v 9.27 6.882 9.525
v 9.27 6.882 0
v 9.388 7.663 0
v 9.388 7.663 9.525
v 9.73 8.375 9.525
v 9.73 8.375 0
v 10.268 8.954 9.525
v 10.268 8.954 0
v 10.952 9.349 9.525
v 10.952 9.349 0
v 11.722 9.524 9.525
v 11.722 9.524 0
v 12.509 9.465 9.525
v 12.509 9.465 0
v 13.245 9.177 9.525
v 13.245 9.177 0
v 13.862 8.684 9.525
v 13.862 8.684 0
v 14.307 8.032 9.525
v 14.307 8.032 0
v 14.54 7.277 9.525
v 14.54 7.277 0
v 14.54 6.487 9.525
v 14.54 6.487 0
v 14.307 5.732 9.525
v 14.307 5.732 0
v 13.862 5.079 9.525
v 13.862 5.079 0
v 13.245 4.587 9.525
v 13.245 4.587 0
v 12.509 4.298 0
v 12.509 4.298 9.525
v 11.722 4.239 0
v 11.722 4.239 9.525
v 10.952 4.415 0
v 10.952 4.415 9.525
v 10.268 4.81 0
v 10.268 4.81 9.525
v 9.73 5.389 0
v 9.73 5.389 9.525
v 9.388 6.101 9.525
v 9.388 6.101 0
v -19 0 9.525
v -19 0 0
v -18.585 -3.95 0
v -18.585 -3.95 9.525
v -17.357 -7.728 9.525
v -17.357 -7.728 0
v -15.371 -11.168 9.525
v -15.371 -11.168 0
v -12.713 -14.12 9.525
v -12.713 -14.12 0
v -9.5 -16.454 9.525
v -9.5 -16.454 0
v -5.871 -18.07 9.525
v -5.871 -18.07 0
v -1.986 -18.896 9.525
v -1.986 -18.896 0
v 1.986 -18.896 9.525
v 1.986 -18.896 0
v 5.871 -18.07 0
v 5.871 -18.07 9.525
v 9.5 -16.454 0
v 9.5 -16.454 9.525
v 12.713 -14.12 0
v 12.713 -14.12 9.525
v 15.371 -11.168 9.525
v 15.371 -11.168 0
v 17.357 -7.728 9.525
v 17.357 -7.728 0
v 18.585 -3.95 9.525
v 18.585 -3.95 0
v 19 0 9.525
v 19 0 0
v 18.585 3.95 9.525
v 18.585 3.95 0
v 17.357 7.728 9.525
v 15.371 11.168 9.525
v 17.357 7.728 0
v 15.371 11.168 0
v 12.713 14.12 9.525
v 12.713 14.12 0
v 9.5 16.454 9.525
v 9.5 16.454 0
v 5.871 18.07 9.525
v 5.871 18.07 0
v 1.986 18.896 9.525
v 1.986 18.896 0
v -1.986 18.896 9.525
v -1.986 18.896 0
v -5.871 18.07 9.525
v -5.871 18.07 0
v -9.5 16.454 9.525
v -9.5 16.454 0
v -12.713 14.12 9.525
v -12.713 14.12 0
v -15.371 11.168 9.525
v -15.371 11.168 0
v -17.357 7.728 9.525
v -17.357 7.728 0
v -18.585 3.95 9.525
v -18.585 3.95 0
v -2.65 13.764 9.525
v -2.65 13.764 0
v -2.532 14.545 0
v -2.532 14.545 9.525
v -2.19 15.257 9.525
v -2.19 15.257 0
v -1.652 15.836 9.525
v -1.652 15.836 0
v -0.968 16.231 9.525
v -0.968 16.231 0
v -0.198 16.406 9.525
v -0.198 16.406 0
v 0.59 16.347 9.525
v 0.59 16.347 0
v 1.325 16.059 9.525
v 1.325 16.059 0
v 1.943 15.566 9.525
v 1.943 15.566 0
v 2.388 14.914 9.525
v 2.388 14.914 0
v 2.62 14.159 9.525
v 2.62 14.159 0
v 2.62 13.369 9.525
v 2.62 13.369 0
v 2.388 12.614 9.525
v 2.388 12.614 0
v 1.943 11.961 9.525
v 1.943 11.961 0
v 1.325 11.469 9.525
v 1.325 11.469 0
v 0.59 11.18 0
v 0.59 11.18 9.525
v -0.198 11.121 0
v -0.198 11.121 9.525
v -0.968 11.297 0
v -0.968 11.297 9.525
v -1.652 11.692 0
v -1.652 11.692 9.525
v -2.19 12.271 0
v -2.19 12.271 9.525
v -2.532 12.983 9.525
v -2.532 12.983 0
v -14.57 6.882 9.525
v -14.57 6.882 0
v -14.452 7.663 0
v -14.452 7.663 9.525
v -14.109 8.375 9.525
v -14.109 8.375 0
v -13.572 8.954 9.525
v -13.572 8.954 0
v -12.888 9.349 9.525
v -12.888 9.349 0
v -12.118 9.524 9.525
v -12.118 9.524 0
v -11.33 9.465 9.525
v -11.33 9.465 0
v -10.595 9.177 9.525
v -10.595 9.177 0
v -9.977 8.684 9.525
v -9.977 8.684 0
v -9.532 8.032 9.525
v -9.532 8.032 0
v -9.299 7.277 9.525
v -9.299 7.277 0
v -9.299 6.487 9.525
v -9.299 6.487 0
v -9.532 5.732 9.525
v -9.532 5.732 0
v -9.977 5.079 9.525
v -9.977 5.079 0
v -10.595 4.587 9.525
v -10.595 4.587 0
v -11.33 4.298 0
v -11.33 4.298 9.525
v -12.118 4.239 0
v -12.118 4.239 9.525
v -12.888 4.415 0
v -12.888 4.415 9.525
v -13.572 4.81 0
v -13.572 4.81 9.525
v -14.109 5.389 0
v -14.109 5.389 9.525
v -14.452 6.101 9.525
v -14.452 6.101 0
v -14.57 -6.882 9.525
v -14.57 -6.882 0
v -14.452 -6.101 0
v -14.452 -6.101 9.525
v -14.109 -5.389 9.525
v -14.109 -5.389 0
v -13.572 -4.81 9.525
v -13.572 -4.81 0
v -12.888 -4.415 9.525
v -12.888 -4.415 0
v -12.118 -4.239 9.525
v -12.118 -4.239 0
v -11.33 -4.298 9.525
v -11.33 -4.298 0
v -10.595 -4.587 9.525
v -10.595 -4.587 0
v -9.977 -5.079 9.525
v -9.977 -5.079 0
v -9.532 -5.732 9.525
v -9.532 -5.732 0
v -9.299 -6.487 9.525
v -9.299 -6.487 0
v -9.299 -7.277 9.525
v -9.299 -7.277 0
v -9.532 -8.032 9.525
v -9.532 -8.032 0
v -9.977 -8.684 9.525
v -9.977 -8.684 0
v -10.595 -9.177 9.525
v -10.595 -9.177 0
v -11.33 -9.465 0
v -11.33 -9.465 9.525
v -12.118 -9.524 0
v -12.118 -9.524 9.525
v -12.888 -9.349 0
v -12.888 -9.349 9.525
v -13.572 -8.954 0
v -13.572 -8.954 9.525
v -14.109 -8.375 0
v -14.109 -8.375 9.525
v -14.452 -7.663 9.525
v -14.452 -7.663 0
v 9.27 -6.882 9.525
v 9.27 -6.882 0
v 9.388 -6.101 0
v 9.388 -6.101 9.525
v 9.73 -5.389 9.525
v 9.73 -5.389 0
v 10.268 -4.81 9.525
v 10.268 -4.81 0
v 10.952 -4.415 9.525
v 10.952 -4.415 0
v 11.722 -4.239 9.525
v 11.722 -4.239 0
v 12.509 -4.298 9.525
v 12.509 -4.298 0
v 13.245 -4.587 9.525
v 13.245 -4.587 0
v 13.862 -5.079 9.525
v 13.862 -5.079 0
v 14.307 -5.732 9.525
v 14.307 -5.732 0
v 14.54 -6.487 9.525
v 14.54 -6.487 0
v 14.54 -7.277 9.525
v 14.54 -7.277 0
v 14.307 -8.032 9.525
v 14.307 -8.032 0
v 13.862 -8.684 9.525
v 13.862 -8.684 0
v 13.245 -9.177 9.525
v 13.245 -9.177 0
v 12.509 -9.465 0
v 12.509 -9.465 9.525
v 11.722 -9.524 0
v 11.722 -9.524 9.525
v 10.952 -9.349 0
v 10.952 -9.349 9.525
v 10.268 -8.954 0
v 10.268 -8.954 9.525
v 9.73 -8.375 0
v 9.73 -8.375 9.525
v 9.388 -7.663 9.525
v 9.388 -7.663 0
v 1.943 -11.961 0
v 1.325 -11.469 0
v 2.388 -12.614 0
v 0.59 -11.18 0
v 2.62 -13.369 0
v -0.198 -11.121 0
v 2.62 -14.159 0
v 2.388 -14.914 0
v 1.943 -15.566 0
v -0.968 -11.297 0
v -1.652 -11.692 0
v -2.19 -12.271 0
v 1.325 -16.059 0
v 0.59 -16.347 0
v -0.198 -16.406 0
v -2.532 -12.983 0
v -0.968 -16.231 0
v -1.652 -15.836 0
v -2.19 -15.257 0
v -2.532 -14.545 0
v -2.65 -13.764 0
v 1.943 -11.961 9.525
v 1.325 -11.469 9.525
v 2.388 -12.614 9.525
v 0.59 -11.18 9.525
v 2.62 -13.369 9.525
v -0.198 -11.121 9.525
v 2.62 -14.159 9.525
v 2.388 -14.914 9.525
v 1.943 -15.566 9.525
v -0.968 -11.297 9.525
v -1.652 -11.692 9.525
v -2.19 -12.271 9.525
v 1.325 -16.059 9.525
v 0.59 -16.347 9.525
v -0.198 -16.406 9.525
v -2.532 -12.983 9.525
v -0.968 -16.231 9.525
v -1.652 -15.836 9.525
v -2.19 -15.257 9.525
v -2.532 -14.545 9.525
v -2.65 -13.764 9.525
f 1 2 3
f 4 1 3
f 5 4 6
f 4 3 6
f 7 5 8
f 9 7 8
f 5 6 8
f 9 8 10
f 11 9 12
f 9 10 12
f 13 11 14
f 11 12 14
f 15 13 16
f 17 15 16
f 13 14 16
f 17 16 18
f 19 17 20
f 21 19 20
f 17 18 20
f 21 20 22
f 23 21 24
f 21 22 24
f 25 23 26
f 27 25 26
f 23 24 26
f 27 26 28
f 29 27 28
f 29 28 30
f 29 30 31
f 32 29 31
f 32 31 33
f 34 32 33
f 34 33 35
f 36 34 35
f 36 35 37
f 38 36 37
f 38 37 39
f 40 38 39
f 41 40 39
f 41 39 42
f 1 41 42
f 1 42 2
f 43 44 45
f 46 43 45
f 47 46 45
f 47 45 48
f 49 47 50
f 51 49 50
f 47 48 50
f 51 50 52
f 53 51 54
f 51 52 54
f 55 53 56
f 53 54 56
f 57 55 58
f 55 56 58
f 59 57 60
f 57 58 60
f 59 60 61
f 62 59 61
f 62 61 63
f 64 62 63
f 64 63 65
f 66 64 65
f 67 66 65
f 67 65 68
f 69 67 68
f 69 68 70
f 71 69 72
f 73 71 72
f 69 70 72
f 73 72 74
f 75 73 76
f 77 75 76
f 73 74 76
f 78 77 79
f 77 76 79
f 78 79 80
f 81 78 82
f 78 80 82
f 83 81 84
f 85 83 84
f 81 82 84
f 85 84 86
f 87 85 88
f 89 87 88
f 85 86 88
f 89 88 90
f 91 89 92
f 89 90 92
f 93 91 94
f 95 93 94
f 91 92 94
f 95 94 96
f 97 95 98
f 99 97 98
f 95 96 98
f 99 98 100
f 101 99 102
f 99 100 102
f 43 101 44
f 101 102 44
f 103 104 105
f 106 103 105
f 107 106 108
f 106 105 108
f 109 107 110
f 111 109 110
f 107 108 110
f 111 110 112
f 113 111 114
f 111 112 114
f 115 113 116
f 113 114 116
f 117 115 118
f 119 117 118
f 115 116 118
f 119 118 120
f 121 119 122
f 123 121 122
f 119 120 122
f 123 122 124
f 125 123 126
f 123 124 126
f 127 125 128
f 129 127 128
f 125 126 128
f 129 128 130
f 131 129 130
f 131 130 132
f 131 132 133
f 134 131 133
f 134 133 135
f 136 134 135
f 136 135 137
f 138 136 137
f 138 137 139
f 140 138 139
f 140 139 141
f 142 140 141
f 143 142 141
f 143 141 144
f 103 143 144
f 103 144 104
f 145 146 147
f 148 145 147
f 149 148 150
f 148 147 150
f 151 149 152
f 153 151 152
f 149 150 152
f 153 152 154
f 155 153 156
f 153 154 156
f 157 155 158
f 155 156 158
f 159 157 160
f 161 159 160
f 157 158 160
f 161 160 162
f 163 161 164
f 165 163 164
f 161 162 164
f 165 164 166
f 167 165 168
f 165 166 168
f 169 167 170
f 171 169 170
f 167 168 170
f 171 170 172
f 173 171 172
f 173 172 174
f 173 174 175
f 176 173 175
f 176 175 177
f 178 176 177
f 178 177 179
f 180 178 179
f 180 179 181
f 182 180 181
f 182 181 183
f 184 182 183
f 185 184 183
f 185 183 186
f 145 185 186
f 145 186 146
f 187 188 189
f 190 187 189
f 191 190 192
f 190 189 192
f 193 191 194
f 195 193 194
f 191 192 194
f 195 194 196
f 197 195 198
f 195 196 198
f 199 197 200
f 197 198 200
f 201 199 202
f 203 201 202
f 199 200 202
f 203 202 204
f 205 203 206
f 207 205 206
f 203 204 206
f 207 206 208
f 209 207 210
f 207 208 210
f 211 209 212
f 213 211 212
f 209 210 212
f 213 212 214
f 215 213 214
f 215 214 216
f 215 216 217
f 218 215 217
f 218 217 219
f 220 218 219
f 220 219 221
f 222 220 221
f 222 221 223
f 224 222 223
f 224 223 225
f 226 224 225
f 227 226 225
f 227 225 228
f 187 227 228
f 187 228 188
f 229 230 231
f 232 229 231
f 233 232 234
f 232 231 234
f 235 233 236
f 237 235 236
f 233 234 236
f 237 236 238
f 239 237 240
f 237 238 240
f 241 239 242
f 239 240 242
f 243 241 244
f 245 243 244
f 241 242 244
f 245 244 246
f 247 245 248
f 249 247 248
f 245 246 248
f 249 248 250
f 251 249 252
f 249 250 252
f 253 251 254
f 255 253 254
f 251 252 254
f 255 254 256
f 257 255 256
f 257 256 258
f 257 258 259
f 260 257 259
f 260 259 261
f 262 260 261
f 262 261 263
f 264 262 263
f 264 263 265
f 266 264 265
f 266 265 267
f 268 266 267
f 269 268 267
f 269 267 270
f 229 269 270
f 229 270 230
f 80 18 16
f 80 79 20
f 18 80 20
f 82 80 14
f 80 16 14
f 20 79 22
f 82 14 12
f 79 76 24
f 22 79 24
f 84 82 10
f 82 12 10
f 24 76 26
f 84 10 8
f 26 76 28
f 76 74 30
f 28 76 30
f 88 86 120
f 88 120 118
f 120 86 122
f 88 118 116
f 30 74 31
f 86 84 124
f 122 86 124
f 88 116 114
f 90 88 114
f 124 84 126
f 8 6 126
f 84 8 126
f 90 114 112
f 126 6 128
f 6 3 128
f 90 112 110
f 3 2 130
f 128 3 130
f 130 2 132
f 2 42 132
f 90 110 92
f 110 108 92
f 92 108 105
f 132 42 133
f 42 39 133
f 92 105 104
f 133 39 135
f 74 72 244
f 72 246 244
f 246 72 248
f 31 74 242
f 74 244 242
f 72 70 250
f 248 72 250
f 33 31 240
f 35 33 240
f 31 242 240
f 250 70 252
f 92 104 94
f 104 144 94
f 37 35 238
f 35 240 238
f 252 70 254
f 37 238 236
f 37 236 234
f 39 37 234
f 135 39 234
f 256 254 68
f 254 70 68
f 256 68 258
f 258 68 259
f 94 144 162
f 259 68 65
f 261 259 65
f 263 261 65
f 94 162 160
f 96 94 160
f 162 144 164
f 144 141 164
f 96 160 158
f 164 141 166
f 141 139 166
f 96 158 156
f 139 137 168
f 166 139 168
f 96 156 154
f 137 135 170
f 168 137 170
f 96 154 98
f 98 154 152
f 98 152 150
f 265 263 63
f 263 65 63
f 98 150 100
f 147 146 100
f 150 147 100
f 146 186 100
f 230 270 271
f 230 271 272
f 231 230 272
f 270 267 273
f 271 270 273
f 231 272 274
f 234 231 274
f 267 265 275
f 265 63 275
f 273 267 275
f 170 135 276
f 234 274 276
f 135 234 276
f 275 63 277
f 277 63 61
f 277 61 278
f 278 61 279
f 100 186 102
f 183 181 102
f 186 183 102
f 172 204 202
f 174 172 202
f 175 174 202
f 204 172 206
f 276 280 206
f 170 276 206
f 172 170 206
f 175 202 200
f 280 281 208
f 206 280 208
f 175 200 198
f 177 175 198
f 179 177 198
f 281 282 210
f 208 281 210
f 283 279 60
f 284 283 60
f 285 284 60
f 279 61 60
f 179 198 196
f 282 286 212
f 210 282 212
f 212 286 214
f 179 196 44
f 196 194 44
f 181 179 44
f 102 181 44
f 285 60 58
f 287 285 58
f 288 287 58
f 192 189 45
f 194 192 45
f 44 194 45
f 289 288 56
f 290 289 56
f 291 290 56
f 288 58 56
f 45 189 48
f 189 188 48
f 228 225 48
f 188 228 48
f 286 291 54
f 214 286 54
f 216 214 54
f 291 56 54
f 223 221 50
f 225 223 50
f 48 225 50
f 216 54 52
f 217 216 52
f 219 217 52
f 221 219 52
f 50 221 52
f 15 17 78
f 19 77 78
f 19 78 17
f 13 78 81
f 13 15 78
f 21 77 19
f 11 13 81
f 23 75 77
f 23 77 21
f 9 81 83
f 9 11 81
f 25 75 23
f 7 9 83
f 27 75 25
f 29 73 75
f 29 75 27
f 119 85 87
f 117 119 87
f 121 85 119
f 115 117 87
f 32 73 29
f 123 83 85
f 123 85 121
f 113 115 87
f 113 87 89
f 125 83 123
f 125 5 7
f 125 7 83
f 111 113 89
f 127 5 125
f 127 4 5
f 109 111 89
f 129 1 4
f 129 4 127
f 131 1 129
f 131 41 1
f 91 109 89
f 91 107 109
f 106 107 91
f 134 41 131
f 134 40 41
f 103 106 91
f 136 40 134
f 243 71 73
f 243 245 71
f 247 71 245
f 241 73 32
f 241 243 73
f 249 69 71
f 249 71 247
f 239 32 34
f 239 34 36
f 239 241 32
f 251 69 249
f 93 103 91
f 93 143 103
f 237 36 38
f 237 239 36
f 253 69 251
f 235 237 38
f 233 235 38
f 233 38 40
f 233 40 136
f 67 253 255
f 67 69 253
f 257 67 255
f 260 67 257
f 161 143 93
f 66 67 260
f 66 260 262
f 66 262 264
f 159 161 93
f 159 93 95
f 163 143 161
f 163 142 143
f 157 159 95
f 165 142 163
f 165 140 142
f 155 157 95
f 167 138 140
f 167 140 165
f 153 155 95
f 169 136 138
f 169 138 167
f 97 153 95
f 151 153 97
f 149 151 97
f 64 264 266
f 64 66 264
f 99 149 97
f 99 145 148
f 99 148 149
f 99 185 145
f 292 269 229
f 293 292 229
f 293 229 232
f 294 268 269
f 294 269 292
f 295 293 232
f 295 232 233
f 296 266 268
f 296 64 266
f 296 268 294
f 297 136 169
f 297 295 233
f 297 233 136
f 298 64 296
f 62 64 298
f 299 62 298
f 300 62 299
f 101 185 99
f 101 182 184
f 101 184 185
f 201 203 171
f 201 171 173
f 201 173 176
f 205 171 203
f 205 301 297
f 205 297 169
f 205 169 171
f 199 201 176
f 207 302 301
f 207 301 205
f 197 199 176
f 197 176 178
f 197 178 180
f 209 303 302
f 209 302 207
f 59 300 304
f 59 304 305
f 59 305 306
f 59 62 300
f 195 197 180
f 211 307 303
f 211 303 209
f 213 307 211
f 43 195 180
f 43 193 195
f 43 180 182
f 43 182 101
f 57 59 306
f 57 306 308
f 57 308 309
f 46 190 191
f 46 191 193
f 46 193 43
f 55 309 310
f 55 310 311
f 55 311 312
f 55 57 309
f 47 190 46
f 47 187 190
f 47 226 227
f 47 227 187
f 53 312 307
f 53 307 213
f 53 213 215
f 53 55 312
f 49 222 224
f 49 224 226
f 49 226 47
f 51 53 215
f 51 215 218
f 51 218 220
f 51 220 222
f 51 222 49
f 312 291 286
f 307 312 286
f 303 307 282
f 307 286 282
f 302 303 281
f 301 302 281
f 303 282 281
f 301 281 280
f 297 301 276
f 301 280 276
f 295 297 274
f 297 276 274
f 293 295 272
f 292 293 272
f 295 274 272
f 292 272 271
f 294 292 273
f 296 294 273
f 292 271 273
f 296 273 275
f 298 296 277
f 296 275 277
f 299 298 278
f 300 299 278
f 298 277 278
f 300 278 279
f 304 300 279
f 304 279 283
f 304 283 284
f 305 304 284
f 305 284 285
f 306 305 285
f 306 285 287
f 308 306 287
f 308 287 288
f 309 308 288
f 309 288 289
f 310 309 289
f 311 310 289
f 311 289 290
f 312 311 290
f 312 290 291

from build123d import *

# Parameters (mm, degrees)
SKETCH1_R            = 19
BOSS_EXTRUDE1_DEPTH  = 9.525
M5_CLEARANCE_HOLE1_D = 5.3


with BuildPart() as part:
    # Sketch1 → Boss-Extrude1 (new body)
    with BuildSketch(Plane.XY):
        with Locations(Location((0, 0, 0), (0, 0, 180))):
            Circle(SKETCH1_R)
    extrude(amount=BOSS_EXTRUDE1_DEPTH)

    # M5 Clearance Hole1 (through all)
    with Locations(Plane.XY.offset(9.525)):
        with Locations((-11.919791467, 6.881894812), (0, 13.763789624), (11.919791467, 6.881894812), (11.919791467, -6.881894812), (0, -13.763789624), (-11.919791467, -6.881894812)):
            Hole(M5_CLEARANCE_HOLE1_D / 2)


solid = part.part
